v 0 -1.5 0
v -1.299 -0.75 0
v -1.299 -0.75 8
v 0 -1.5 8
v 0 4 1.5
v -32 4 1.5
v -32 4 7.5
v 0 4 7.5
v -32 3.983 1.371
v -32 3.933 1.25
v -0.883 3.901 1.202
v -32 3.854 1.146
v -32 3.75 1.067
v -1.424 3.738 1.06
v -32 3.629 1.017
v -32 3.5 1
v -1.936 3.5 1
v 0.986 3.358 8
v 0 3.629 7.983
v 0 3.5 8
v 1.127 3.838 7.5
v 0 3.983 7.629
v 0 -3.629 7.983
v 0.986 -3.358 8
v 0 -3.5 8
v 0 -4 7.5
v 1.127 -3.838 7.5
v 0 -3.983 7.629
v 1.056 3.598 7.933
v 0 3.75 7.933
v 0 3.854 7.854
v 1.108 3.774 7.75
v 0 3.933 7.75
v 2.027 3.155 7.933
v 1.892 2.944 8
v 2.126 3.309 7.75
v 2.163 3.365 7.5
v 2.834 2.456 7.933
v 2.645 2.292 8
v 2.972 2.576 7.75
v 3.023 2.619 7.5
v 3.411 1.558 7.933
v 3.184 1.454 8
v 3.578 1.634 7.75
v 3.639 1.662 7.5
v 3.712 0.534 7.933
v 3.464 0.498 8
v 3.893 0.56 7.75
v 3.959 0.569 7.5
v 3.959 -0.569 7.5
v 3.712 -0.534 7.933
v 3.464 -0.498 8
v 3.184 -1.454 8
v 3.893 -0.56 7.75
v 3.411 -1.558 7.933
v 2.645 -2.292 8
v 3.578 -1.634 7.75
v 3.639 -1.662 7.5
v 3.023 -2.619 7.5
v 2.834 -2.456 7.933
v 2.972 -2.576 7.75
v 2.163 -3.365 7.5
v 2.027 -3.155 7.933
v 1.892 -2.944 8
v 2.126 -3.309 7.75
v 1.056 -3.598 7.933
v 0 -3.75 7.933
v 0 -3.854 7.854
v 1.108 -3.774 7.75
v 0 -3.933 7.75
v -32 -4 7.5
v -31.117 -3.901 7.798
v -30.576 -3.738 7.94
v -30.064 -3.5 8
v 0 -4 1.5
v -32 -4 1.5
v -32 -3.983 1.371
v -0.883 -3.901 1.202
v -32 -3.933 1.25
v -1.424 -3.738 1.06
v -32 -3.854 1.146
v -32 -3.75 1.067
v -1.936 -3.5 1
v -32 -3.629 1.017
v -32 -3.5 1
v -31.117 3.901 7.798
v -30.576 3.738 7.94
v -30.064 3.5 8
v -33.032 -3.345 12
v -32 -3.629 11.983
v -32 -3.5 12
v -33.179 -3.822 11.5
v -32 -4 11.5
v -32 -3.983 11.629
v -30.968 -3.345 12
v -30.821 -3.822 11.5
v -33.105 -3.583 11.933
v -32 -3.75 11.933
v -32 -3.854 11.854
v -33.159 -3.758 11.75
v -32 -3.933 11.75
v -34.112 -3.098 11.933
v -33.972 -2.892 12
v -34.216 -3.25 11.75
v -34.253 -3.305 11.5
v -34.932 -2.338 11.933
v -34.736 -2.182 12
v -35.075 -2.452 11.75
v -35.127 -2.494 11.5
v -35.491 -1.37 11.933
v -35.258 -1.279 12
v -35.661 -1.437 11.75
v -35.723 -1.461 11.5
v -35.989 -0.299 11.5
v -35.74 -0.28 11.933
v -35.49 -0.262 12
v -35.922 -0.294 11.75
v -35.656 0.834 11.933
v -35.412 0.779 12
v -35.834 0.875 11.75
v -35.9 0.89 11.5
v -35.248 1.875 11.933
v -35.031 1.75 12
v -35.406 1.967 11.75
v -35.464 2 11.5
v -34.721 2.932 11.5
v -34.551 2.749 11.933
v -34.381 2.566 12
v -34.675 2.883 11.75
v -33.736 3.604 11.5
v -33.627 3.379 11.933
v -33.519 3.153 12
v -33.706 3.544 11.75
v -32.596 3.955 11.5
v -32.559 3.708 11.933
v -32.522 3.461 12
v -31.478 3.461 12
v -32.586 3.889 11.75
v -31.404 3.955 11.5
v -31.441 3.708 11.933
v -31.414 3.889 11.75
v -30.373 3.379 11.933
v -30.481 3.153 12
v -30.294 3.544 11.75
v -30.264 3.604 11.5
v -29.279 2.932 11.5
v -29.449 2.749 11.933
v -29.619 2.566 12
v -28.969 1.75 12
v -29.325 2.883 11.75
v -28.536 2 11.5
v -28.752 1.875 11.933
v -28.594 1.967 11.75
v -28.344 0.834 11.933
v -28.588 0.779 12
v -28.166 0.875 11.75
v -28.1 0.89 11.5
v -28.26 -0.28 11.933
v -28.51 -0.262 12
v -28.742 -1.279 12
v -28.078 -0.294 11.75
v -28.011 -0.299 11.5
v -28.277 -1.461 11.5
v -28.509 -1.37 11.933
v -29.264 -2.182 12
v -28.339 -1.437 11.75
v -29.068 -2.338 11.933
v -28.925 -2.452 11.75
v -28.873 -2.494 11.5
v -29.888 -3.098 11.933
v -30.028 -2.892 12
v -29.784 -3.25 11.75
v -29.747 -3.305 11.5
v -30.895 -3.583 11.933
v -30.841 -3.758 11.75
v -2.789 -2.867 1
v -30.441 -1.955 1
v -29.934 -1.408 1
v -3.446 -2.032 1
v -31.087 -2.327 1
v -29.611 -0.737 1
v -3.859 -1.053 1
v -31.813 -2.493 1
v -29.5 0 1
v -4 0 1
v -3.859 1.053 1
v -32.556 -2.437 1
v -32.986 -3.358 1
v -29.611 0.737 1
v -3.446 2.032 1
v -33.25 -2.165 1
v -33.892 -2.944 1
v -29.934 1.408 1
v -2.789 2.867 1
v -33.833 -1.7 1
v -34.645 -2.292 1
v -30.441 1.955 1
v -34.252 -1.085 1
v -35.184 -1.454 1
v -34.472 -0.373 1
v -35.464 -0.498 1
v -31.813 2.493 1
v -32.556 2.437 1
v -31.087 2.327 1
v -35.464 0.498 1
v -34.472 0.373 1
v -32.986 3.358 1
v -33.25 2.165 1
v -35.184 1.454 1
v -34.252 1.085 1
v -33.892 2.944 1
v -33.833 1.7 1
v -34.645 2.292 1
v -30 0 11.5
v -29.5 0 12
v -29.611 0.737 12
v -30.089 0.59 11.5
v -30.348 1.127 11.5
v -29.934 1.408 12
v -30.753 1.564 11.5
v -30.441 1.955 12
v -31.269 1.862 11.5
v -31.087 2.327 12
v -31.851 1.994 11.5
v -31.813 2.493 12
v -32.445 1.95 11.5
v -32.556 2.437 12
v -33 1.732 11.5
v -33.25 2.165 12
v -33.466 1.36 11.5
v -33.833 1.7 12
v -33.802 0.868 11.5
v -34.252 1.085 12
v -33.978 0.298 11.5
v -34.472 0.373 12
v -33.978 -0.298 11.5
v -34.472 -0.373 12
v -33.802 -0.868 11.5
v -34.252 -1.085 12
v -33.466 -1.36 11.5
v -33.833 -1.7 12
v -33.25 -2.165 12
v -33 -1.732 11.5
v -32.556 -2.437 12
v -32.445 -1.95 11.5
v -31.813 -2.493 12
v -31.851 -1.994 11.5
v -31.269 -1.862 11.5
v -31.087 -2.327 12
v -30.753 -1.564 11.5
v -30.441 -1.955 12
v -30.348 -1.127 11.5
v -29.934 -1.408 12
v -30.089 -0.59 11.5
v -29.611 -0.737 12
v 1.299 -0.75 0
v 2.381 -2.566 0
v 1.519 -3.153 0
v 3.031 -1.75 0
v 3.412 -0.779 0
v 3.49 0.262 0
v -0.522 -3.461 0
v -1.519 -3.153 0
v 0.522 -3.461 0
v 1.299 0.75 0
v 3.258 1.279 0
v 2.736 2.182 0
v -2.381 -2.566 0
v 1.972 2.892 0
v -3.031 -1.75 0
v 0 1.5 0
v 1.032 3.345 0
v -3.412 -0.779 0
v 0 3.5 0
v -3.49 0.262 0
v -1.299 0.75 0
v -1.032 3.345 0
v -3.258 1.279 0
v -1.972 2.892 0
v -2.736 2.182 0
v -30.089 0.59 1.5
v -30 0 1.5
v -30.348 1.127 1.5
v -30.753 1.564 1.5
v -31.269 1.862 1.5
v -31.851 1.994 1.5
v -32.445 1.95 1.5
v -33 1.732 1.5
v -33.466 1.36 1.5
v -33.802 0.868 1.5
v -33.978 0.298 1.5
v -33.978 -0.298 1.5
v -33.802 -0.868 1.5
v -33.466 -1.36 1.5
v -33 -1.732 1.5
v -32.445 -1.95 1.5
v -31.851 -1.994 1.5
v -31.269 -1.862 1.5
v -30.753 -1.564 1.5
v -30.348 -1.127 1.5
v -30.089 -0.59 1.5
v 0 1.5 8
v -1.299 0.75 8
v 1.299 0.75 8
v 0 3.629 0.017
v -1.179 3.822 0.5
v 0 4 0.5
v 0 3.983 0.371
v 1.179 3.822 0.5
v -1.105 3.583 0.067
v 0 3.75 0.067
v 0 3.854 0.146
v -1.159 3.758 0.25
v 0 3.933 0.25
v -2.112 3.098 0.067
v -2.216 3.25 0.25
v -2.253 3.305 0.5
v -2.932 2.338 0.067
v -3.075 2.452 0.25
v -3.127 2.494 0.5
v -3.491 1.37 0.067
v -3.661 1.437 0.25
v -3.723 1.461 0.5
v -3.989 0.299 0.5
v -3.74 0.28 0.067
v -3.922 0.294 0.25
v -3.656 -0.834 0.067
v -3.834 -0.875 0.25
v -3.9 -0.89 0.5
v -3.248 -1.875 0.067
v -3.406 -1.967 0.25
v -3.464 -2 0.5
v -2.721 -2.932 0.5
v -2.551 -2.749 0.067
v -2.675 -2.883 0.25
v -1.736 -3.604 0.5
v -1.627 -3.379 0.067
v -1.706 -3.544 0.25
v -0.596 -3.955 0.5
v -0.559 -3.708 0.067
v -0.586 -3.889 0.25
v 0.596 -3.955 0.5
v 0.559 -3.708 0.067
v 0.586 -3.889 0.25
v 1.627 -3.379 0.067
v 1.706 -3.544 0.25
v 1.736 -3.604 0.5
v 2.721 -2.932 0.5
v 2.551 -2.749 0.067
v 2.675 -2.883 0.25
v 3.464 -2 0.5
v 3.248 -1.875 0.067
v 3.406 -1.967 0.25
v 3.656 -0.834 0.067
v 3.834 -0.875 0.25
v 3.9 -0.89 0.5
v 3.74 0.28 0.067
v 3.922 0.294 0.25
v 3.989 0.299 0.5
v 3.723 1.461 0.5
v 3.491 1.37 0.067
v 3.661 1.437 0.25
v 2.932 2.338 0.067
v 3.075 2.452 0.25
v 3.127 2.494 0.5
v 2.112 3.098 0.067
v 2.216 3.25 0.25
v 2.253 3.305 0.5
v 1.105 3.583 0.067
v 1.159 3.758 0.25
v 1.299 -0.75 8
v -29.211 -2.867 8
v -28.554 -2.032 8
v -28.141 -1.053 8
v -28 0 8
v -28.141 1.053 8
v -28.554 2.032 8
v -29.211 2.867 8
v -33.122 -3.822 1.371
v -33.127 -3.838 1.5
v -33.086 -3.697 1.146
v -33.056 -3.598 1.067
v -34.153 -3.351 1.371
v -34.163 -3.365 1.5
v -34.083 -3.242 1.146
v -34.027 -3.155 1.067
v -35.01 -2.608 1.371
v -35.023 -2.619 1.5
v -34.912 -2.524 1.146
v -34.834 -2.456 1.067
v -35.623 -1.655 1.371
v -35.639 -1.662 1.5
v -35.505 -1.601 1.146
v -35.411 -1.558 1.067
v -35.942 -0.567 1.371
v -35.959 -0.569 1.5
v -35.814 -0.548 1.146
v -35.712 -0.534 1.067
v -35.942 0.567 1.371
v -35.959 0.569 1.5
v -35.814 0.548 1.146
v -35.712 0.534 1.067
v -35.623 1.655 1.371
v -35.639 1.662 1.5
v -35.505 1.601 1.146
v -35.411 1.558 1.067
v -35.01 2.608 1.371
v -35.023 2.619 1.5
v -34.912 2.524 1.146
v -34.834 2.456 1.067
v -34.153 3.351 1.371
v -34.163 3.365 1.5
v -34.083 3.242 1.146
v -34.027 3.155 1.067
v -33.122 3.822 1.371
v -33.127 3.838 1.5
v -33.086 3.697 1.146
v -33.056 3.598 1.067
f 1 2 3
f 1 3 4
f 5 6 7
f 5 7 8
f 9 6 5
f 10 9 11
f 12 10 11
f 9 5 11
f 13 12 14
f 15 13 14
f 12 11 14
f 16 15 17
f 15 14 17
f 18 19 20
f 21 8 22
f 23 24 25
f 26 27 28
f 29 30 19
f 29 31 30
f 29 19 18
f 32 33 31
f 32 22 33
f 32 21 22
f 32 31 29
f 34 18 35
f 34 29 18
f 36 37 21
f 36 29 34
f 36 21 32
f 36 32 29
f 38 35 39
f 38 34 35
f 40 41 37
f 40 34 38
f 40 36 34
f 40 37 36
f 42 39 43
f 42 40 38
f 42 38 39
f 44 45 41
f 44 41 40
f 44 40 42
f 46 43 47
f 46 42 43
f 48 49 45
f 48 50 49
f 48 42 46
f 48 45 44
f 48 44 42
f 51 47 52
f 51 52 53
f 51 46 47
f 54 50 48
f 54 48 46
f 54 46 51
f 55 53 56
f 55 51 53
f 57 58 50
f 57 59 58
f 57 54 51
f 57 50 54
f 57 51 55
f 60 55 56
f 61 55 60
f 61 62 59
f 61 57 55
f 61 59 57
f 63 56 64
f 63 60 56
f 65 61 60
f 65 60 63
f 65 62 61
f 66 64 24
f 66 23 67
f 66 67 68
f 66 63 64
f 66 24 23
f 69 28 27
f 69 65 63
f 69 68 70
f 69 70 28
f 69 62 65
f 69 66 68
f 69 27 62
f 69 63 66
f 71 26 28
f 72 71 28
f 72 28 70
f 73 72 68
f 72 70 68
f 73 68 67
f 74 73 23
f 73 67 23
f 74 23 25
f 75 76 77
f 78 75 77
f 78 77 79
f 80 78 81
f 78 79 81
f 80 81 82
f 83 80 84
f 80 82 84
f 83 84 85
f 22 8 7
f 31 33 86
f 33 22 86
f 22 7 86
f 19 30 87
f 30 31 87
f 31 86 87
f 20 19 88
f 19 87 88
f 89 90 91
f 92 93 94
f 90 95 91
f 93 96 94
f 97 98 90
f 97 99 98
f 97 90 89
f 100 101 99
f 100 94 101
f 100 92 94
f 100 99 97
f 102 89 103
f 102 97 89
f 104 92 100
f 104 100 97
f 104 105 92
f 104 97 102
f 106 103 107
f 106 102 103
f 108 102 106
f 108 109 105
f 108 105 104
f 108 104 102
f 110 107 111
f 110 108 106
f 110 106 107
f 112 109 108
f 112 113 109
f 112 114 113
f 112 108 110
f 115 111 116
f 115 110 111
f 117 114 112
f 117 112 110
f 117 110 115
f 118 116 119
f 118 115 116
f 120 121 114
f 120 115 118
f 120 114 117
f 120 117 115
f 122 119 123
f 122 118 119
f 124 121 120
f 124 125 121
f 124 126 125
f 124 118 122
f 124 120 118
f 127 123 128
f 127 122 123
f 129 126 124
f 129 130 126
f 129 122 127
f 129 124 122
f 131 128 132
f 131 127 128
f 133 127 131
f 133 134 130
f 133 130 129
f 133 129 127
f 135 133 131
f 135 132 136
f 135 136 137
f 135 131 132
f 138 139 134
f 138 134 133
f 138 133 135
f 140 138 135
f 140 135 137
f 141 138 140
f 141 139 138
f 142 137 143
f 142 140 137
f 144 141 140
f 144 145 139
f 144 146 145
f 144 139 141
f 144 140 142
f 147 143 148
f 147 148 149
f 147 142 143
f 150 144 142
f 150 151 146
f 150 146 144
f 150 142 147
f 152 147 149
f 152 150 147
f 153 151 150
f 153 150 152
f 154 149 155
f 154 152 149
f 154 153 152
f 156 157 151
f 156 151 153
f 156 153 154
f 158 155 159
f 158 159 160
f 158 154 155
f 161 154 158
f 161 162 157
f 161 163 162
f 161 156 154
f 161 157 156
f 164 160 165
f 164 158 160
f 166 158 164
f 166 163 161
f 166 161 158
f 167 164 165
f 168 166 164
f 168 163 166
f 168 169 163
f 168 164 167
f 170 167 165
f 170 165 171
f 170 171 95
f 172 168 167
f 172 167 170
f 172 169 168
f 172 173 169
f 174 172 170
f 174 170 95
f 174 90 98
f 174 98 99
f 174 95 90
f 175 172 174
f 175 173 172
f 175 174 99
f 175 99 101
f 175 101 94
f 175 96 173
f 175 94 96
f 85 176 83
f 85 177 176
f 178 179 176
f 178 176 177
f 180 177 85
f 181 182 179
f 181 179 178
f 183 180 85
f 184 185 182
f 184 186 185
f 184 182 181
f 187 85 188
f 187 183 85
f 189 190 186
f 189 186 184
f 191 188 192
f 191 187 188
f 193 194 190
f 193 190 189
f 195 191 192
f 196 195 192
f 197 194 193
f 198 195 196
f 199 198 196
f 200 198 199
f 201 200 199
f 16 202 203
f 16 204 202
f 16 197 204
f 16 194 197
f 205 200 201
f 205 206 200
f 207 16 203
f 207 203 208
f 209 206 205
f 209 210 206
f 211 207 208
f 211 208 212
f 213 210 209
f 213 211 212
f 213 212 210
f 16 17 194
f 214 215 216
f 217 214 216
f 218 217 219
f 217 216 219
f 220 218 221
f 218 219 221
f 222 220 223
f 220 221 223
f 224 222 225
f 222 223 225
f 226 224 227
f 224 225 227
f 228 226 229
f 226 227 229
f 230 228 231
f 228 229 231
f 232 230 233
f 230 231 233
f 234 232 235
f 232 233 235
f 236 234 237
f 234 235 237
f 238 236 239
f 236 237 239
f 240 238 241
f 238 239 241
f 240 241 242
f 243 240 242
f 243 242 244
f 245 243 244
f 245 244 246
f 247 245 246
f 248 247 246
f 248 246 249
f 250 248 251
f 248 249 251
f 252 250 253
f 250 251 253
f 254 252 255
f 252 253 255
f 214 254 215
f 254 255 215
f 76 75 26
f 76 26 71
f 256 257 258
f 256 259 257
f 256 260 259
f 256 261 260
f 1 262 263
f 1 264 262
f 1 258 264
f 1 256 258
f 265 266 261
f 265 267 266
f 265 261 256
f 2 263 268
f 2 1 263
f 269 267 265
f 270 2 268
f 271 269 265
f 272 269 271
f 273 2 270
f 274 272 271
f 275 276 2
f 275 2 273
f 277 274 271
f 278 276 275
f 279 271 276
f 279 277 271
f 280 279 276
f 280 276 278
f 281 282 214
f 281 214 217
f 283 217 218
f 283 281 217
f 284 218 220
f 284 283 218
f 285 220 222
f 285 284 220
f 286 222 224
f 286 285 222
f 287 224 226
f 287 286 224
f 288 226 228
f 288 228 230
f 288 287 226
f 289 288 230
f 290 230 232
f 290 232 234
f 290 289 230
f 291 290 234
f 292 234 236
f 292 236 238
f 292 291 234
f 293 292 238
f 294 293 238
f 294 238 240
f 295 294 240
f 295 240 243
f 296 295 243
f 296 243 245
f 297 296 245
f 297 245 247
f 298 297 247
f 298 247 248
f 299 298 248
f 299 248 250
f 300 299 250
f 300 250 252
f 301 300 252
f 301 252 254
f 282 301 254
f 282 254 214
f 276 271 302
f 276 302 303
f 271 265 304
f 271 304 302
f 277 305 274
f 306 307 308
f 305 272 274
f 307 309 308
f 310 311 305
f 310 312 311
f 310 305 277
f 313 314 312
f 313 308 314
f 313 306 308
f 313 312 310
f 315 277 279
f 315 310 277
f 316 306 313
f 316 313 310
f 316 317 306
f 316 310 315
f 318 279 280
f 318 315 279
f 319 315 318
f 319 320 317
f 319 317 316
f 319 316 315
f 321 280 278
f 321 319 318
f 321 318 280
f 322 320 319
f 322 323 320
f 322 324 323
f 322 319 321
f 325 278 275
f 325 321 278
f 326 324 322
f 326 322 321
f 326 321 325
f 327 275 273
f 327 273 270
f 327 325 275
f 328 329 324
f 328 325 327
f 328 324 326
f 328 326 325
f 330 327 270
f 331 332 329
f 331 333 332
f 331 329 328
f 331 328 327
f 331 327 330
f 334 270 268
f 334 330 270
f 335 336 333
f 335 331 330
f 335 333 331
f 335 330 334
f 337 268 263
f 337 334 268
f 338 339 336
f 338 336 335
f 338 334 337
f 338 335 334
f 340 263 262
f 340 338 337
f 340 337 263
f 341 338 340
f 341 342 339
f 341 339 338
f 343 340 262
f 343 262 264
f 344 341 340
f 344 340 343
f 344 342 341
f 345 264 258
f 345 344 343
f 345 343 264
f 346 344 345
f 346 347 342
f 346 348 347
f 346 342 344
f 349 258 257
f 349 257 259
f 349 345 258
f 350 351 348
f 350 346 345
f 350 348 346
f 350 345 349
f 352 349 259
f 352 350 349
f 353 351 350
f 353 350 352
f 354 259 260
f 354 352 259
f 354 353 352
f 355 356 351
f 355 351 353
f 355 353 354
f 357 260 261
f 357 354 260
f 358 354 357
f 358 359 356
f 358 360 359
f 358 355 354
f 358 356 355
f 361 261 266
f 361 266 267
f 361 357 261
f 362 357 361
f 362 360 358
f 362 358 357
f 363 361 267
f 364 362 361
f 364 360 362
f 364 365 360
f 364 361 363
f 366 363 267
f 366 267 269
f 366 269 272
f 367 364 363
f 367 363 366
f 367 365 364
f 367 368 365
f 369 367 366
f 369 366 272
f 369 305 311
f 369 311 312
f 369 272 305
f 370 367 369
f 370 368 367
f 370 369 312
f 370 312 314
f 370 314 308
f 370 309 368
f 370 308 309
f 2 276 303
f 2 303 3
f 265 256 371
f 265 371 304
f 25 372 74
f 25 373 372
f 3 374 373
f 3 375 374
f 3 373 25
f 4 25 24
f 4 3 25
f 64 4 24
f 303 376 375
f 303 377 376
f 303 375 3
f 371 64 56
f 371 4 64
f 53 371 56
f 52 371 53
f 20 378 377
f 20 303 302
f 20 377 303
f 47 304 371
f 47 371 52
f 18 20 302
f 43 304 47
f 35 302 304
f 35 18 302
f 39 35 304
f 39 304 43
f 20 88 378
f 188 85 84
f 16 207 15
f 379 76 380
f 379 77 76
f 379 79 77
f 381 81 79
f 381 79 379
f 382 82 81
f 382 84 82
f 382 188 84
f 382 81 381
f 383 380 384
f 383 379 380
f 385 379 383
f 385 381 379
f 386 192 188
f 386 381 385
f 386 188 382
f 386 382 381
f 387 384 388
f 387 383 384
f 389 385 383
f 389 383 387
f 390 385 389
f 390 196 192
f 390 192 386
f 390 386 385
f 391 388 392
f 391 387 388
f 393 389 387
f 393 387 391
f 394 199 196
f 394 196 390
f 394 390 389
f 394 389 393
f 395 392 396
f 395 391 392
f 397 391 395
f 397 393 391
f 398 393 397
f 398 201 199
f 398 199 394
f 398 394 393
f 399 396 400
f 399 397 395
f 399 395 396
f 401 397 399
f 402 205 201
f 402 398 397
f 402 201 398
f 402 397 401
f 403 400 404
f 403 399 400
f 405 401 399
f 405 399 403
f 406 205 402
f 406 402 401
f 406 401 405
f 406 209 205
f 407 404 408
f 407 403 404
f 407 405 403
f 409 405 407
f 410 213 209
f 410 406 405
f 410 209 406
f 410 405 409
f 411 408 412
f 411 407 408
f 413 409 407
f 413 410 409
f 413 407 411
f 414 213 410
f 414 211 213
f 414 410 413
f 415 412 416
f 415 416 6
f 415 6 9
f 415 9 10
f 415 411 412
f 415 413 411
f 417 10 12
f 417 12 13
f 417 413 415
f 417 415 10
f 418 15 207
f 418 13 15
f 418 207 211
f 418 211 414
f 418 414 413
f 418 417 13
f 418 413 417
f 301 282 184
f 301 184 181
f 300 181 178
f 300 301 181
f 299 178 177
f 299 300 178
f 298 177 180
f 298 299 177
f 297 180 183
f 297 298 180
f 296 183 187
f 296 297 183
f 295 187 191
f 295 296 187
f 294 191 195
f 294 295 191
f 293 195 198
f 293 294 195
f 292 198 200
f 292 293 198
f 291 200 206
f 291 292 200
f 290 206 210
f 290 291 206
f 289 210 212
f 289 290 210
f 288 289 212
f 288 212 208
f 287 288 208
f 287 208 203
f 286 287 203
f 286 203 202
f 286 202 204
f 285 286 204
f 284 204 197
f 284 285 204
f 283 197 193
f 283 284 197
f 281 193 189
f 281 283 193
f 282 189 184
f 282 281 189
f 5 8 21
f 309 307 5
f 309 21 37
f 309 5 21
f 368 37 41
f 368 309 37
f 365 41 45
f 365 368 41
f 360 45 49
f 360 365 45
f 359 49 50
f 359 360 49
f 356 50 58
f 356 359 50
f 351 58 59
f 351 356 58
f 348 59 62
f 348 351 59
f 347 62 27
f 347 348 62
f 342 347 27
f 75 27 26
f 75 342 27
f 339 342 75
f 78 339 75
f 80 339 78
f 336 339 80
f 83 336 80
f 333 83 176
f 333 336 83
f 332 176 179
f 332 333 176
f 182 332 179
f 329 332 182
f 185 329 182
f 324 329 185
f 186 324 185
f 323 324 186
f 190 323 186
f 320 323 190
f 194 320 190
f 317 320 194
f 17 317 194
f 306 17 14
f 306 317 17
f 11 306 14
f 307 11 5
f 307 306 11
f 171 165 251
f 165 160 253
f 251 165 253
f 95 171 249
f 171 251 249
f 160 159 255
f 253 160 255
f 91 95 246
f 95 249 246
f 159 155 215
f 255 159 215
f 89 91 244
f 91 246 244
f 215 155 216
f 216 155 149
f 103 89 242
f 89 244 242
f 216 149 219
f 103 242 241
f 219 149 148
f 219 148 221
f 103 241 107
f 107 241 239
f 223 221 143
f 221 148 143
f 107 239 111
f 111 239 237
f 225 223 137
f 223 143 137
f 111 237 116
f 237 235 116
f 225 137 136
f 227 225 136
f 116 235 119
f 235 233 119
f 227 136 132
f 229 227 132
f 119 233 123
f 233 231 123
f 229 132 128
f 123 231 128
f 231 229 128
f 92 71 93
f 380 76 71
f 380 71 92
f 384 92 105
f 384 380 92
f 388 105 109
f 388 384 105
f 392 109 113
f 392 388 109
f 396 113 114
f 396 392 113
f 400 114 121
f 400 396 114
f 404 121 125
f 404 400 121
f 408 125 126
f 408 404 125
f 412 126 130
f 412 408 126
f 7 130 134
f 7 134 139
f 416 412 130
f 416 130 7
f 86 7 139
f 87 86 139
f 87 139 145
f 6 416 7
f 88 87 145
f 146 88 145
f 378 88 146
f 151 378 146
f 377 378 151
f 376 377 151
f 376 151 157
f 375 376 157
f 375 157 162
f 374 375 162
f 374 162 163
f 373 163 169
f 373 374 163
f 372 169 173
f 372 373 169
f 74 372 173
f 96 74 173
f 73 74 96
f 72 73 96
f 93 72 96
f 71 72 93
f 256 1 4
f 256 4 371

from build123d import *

# Parameters (mm, degrees)
ESBO_O1_R                = 2
RESSALTO_EXTRUS_O1_DEPTH = 12
ESBO_O2_OUTSIDE_W        = 50.504
ESBO_O2_OUTSIDE_H        = 18.504
ESBO_O2_OUTSIDE_R        = 4
CORTE_EXTRUS_O1_DEPTH    = 1
ESBO_O3_OUTSIDE_W        = 50.504
ESBO_O3_OUTSIDE_H        = 18.504
ESBO_O3_OUTSIDE_R        = 4
CORTE_EXTRUS_O2_DEPTH    = 4
FILETE1_R                = 0.5
CHANFRO1_SIZE            = 0.5


with BuildPart() as part:
    # Esboço1 → Ressalto-extrusão1 (new body)
    with BuildSketch(Plane.XY):
        with BuildLine():
            Line((0, -4), (-32, -4))
            ThreePointArc((-32, -4), (-36, 0), (-32, 4))
            Line((-32, 4), (0, 4))
            ThreePointArc((0, 4), (4, 0), (0, -4))
        make_face()
        with Locations((-32, 0)):
            Circle(ESBO_O1_R, mode=Mode.SUBTRACT)
        Polygon((0, 1.500013734), (-1.29905, 0.750006867), (-1.29905, -0.750006867), (0, -1.500013734), (1.29905, -0.750006867), (1.29905, 0.750006867), align=None, mode=Mode.SUBTRACT)
    extrude(amount=RESSALTO_EXTRUS_O1_DEPTH)

    # Esboço2 outside → Corte-extrusão1 (cut)
    with BuildSketch(Plane(origin=(0, 0, 0), x_dir=(-1, 0, 0), z_dir=(0, 0, -1))):
        with Locations((16, 0)):
            Rectangle(ESBO_O2_OUTSIDE_W, ESBO_O2_OUTSIDE_H)
        with Locations(Location((0, 0, 0), (0, 0, 90))):
            Circle(ESBO_O2_OUTSIDE_R, mode=Mode.SUBTRACT)
    extrude(amount=-CORTE_EXTRUS_O1_DEPTH, mode=Mode.SUBTRACT)

    # Esboço3 outside → Corte-extrusão2 (cut)
    with BuildSketch(Plane.XY.offset(12)):
        with Locations((-16, 0)):
            Rectangle(ESBO_O3_OUTSIDE_W, ESBO_O3_OUTSIDE_H)
        with Locations(Location((-32, 0, 0), (0, 0, 90))):
            Circle(ESBO_O3_OUTSIDE_R, mode=Mode.SUBTRACT)
    extrude(amount=-CORTE_EXTRUS_O2_DEPTH, mode=Mode.SUBTRACT)

    # Filete1
    # the kernel refuses this fillet: 0.5 mm, written as the material it takes off along each edge
    with BuildSketch(Plane(origin=(-32, 0, 12), x_dir=(0, -1, 0), z_dir=(1, 0, 0))) as filete1_piece_1:
        with BuildLine():
            CenterArc((4 - FILETE1_R, FILETE1_R), FILETE1_R, 270, 90)
            Line((4, FILETE1_R), (4, 0))
            Line((4, 0), (4 - FILETE1_R, 0))
        make_face()
    revolve(axis=Axis((-32, 0, 12), (0, 0, -1)), mode=Mode.SUBTRACT)
    with BuildSketch(Plane(origin=(-32, 0, 1), x_dir=(0, -1, 0), z_dir=(1, 0, 0))) as filete1_piece_2:
        with BuildLine():
            CenterArc((4 - FILETE1_R, -FILETE1_R), FILETE1_R, 0, 90)
            Line((4, -FILETE1_R), (4, 0))
            Line((4, 0), (4 - FILETE1_R, 0))
        make_face()
    revolve(axis=Axis((-32, 0, 1), (0, 0, -1)), revolution_arc=180, mode=Mode.SUBTRACT)
    with BuildSketch(Plane(origin=(1.25, 4, 1), x_dir=(0, -1, 0), z_dir=(-1, 0, 0))) as filete1_piece_3_section:
        with BuildLine():
            CenterArc((FILETE1_R, FILETE1_R), FILETE1_R, 180, 90)
            Line((0, FILETE1_R), (0, 0))
            Line((0, 0), (FILETE1_R, 0))
        make_face()
    filete1_piece_3 = extrude(amount=33.25, mode=Mode.PRIVATE)
    filete1_piece_3 = filete1_piece_3 - Plane(origin=(0, 0, 1.115122713), x_dir=(0, 1, 0), z_dir=(0, 0, -1)) * Cylinder(4, 69, mode=Mode.PRIVATE)
    add(filete1_piece_3, mode=Mode.SUBTRACT)
    with BuildSketch(Plane(origin=(-32, -4, 1), x_dir=(0, 0, 1), z_dir=(1, 0, 0))) as filete1_piece_4_section:
        with BuildLine():
            CenterArc((FILETE1_R, -FILETE1_R), FILETE1_R, 90, 90)
            Line((0, -FILETE1_R), (0, 0))
            Line((0, 0), (FILETE1_R, 0))
        make_face()
    filete1_piece_4 = extrude(amount=33.25, mode=Mode.PRIVATE)
    filete1_piece_4 = filete1_piece_4 - Plane(origin=(0, 0, 1.115122438), x_dir=(0, 1, 0), z_dir=(0, 0, -1)) * Cylinder(4, 69, mode=Mode.PRIVATE)
    add(filete1_piece_4, mode=Mode.SUBTRACT)
    with BuildSketch(Plane(origin=(0, 0, 0), x_dir=(0, 1, 0), z_dir=(1, 0, 0))) as filete1_piece_5:
        with BuildLine():
            CenterArc((4 - FILETE1_R, FILETE1_R), FILETE1_R, 270, 90)
            Line((4 - FILETE1_R, 0), (4, 0))
            Line((4, 0), (4, FILETE1_R))
        make_face()
    revolve(axis=Axis((0, 0, 0), (0, 0, 1)), mode=Mode.SUBTRACT)
    with BuildSketch(Plane(origin=(0, 0, 8), x_dir=(0, 1, 0), z_dir=(-1, 0, 0))) as filete1_piece_6:
        with BuildLine():
            CenterArc((4 - FILETE1_R, FILETE1_R), FILETE1_R, 270, 90)
            Line((4 - FILETE1_R, 0), (4, 0))
            Line((4, 0), (4, FILETE1_R))
        make_face()
    revolve(axis=Axis((0, 0, 8), (0, 0, -1)), revolution_arc=180, mode=Mode.SUBTRACT)
    with BuildSketch(Plane(origin=(-33.25, 4, 8), x_dir=(0, 0, -1), z_dir=(1, 0, 0))) as filete1_piece_7_section:
        with BuildLine():
            CenterArc((FILETE1_R, -FILETE1_R), FILETE1_R, 90, 90)
            Line((0, -FILETE1_R), (0, 0))
            Line((0, 0), (FILETE1_R, 0))
        make_face()
    filete1_piece_7 = extrude(amount=33.25, mode=Mode.PRIVATE)
    filete1_piece_7 = filete1_piece_7 - Plane(origin=(-32, 0, 7.884877562), x_dir=(0, -1, 0), z_dir=(0, 0, -1)) * Cylinder(4, 69, mode=Mode.PRIVATE)
    add(filete1_piece_7, mode=Mode.SUBTRACT)
    with BuildSketch(Plane(origin=(0, -4, 8), x_dir=(0, 0, -1), z_dir=(-1, 0, 0))) as filete1_piece_8_section:
        with BuildLine():
            CenterArc((FILETE1_R, -FILETE1_R), FILETE1_R, 90, 90)
            Line((0, -FILETE1_R), (0, 0))
            Line((0, 0), (FILETE1_R, 0))
        make_face()
    filete1_piece_8 = extrude(amount=33.25, mode=Mode.PRIVATE)
    filete1_piece_8 = filete1_piece_8 - Plane(origin=(-32, 0, 7.884877562), x_dir=(0, -1, 0), z_dir=(0, 0, -1)) * Cylinder(4, 69, mode=Mode.PRIVATE)
    add(filete1_piece_8, mode=Mode.SUBTRACT)

    # Chanfro1
    chanfro1_edges = [part.edges().sort_by_distance(p)[0] for p in [
        (-34, 0, 12),
        (-34, 0, 1),
    ]]
    chamfer(chanfro1_edges, length=CHANFRO1_SIZE)


solid = part.part
